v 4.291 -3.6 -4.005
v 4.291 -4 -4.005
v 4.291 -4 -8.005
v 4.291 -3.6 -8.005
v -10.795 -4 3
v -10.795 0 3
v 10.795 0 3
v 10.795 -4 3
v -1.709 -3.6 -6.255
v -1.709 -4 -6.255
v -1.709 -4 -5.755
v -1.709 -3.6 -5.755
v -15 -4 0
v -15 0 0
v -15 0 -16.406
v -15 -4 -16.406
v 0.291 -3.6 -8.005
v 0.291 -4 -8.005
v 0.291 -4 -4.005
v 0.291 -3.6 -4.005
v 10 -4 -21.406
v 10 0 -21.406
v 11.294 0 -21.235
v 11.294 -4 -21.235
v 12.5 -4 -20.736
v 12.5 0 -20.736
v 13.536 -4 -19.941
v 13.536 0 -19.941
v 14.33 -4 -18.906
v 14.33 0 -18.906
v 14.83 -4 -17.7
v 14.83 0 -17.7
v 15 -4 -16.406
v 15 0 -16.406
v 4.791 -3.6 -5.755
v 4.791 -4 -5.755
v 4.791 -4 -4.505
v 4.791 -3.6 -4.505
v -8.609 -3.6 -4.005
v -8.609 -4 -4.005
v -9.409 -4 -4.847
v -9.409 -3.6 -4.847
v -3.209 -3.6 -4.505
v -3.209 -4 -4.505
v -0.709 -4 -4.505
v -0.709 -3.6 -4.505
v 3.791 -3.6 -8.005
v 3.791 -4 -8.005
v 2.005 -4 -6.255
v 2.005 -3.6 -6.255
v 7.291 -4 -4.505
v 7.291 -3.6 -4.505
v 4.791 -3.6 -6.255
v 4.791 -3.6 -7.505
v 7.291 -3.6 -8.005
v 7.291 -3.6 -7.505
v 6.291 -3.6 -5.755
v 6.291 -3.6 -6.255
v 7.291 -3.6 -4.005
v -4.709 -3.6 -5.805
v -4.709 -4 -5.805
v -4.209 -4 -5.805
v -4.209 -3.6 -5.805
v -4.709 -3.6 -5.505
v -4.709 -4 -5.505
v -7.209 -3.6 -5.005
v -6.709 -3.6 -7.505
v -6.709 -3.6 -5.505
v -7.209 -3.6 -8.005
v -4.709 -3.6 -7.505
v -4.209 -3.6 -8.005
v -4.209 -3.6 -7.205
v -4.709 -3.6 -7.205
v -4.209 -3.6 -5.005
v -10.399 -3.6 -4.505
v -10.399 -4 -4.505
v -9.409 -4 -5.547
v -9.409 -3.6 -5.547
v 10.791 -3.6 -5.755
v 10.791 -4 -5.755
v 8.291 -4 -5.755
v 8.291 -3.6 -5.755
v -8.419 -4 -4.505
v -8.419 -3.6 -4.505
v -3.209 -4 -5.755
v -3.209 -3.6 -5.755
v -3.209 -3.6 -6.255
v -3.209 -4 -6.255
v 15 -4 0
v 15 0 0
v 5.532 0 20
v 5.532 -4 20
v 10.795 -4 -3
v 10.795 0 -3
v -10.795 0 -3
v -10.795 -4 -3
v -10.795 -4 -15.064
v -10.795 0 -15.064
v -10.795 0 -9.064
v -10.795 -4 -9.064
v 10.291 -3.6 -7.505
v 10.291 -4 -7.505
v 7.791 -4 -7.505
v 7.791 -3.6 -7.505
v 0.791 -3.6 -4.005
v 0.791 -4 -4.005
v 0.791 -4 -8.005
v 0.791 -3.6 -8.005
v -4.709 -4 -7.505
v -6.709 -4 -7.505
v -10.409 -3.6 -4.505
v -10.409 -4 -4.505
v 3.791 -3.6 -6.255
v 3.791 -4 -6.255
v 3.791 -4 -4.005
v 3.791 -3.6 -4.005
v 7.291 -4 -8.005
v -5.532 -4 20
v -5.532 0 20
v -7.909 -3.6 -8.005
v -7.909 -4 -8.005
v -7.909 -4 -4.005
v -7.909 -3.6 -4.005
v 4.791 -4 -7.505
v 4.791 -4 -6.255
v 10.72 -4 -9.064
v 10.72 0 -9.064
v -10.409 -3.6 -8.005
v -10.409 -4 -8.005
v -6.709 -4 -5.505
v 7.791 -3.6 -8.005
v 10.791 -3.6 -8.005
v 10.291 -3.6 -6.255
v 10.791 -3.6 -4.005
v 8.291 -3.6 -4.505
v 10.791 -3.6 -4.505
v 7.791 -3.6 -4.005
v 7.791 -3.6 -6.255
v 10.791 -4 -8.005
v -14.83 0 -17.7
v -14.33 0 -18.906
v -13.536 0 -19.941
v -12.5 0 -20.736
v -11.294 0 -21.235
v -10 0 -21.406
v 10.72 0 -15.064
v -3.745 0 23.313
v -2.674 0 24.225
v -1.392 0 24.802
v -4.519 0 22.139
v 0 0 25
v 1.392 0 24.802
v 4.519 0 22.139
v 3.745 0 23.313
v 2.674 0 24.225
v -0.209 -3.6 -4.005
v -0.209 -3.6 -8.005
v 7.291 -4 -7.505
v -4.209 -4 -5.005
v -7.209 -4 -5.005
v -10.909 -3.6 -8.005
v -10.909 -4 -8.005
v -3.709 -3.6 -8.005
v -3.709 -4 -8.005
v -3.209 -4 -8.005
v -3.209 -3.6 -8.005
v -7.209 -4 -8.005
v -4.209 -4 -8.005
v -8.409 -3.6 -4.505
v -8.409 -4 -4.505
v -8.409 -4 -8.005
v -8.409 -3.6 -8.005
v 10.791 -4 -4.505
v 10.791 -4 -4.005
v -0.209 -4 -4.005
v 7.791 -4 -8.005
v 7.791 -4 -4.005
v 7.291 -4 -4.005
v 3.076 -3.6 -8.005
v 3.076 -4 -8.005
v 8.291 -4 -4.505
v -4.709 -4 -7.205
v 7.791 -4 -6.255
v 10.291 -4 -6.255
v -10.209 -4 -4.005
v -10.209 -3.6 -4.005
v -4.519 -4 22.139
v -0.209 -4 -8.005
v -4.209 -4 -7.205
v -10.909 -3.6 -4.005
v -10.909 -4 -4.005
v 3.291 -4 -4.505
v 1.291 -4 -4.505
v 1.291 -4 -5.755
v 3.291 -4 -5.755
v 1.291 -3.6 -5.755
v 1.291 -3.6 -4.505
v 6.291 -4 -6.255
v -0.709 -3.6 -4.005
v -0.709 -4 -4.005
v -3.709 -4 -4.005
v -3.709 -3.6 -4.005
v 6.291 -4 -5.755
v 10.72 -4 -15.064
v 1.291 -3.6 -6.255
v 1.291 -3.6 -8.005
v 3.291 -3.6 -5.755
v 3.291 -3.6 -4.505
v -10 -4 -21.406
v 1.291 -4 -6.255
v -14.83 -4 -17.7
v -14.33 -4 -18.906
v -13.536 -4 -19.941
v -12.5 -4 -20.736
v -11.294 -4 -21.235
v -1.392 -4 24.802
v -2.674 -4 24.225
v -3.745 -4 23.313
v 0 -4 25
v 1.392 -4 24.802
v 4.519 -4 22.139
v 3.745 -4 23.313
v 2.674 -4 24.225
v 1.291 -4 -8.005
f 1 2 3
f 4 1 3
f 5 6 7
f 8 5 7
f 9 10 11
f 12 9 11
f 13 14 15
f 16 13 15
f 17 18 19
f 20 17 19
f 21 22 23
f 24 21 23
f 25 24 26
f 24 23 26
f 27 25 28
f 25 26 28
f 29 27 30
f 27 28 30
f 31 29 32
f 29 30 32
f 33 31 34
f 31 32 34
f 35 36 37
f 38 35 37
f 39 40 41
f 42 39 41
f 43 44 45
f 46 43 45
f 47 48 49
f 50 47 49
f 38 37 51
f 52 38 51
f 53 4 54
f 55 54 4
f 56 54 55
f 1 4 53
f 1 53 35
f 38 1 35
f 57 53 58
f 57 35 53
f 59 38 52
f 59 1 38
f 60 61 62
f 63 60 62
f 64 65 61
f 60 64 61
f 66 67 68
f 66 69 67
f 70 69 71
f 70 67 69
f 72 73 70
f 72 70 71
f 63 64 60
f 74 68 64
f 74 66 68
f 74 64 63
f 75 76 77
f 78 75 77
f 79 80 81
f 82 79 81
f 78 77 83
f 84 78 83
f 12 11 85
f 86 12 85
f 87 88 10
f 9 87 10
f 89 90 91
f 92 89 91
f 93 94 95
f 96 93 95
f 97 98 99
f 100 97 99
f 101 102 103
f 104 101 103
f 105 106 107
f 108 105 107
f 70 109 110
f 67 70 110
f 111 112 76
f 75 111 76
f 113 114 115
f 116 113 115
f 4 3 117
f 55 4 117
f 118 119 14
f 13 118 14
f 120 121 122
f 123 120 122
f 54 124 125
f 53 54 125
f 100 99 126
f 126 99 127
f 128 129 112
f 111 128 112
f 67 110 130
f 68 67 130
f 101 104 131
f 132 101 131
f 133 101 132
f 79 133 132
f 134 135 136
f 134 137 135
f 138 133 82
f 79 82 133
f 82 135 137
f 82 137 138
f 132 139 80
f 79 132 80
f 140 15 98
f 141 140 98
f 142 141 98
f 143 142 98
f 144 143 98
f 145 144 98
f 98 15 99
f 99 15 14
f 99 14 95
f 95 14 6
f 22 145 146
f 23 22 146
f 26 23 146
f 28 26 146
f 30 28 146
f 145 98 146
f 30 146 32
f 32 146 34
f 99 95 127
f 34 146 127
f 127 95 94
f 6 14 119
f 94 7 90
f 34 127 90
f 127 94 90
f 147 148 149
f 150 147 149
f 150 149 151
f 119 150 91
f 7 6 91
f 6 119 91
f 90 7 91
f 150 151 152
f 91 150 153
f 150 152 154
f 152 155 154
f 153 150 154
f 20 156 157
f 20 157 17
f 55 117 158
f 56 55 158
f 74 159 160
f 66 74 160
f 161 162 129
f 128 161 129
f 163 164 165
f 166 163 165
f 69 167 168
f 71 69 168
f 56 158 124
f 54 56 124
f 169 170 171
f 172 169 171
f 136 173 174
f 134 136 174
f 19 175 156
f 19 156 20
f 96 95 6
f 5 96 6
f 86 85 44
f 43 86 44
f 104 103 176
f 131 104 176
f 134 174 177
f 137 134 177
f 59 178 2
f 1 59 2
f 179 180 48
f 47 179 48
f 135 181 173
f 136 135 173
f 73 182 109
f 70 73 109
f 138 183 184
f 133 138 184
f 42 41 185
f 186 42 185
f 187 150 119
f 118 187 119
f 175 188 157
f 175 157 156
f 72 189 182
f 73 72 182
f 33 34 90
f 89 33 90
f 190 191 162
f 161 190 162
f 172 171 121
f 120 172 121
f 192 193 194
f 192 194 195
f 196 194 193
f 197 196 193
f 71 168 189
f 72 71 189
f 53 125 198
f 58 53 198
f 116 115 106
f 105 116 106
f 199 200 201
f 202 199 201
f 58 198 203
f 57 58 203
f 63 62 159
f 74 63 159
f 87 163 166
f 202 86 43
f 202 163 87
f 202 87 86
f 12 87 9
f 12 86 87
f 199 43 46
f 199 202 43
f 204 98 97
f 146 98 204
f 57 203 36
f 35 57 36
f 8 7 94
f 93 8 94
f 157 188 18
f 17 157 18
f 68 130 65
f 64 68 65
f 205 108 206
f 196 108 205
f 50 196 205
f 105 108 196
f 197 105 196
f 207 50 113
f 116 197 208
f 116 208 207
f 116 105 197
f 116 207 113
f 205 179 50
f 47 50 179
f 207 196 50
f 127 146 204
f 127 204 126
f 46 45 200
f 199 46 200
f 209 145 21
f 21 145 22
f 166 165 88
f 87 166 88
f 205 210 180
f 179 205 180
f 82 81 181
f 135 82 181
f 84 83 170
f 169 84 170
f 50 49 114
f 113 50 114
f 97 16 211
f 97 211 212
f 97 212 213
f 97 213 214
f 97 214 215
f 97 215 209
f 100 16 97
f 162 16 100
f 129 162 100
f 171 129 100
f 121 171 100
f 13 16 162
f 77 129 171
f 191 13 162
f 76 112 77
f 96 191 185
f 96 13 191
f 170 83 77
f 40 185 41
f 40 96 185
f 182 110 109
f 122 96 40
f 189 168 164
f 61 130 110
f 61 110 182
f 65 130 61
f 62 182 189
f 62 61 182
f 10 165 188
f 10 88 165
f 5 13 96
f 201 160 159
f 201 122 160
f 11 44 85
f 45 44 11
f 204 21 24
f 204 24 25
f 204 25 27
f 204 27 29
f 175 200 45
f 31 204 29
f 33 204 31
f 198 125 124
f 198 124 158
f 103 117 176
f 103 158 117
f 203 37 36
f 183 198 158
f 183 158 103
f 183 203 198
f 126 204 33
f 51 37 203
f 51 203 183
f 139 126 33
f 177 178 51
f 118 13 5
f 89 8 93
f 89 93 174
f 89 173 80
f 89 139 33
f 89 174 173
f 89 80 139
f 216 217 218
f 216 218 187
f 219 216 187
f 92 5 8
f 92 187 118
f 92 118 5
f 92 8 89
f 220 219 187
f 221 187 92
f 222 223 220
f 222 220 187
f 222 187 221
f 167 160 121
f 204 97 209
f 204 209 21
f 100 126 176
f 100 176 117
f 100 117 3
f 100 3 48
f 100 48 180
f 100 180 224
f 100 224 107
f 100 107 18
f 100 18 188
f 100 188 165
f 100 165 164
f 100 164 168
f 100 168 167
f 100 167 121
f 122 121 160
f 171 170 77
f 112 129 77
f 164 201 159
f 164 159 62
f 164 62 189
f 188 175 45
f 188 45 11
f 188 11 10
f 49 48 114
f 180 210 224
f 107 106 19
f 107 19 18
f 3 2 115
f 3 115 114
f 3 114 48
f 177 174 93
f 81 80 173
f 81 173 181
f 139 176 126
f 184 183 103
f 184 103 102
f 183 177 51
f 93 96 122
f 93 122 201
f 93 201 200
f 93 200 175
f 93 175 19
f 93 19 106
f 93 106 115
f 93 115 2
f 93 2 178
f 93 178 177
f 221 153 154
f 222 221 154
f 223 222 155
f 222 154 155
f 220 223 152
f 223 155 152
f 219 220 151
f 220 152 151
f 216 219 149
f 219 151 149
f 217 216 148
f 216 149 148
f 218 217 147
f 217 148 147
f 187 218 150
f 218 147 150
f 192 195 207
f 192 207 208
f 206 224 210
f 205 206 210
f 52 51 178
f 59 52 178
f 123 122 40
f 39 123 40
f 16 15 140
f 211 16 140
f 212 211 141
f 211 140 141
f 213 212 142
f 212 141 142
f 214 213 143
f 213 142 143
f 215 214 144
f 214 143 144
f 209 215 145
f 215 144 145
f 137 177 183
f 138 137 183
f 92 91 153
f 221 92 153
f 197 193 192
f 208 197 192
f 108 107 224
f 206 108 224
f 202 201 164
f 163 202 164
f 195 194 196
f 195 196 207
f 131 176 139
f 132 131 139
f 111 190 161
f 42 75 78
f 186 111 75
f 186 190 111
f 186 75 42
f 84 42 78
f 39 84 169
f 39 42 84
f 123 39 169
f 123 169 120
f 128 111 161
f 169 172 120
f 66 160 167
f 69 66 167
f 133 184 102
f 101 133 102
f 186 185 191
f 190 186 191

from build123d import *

# Parameters (mm, degrees)
F0_W     = 21.5146457776
F0_H     = 6
F1_DEPTH = 4
F2_W     = 0.5
F2_H     = 4
F2_W_2   = 2
F2_H_2   = 1.25
F3_DEPTH = 0.4


# Not quite as in the source:
# - a feature names something its author has since deleted; it is built from what else it names


with BuildPart() as f1:
    # F0 (on Front) → F1 (new body)
    with BuildSketch(Plane.XZ):
        with BuildLine():
            ThreePointArc((-5, 20), (0, 15), (5, 20))
            Line((5, 20), (-5, 20))
        make_face()
        with BuildLine():
            Line((-5, 20), (5, 20))
            ThreePointArc((5, 20), (4.8783151775, 21.0963763172), (4.5191835885, 22.1393876913))
            ThreePointArc((4.5191835885, 22.1393876913), (0, 25), (-4.5191835885, 22.1393876913))
            ThreePointArc((-4.5191835885, 22.1393876913), (-4.8783151775, 21.0963763172), (-5, 20))
        make_face()
        with BuildLine():
            Line((5.5319726474, 20), (5, 20))
            ThreePointArc((5, 20), (0, 15), (-5, 20))
            Line((-5, 20), (-5.5319726474, 20))
            Line((-5.5319726474, 20), (-15, 0))
            Line((-15, 0), (-10.795, 0))
            Line((-10.795, 0), (-10.795, 3))
            Line((-10.795, 3), (10.795, 3))
            Line((10.795, 3), (10.795, 0))
            Line((10.795, 0), (15, 0))
            Line((15, 0), (5.5319726474, 20))
        make_face()
        with BuildLine():
            Line((15, -16.4057657868), (15, 0))
            Line((15, 0), (10.795, 0))
            Line((10.795, 0), (10.795, -3))
            Line((10.795, -3), (-10.795, -3))
            Line((-10.795, -3), (-10.795, 0))
            Line((-10.795, 0), (-15, 0))
            Line((-15, 0), (-15, -16.4057657868))
            ThreePointArc((-15, -16.4057657868), (-13.5355339059, -19.9412996927), (-10, -21.4057657868))
            Line((-10, -21.4057657868), (10, -21.4057657868))
            ThreePointArc((10, -21.4057657868), (13.5355339059, -19.9412996927), (15, -16.4057657868))
        make_face()
        with Locations((-0.0376771112, -12.0637425241)):
            Rectangle(F0_W, F0_H, mode=Mode.SUBTRACT)
        with BuildLine():
            Line((-5.5319726474, 20), (-5, 20))
            ThreePointArc((-5, 20), (-4.8783151775, 21.0963763172), (-4.5191835885, 22.1393876913))
            Line((-4.5191835885, 22.1393876913), (-5.5319726474, 20))
        make_face()
        with BuildLine():
            ThreePointArc((4.5191835885, 22.1393876913), (4.8783151775, 21.0963763172), (5, 20))
            Line((5, 20), (5.5319726474, 20))
            Line((5.5319726474, 20), (4.5191835885, 22.1393876913))
        make_face()
    extrude(amount=F1_DEPTH)

    # F2 (on face) → F3 (cut)
    with BuildSketch(Plane.XZ.offset(4)):
        Polygon((-10.4092183411, -4.0046597868), (-10.9092183411, -4.0046597868), (-10.9092183411, -8.0046597868), (-10.4092183411, -8.0046597868), (-10.4092183411, -4.5046597868), (-10.3992183411, -4.5046597868), (-9.4092183411, -5.54676505), (-8.4192183411, -4.5046597868), (-8.4092183411, -4.5046597868), (-8.4092183411, -8.0046597868), (-7.9092183411, -8.0046597868), (-7.9092183411, -4.0046597868), (-8.4092183411, -4.0046597868), (-8.6092183411, -4.0046597868), (-9.4092183411, -4.84676505), (-10.2092183411, -4.0046597868), align=None)
        Polygon((-4.2092183411, -5.0046597868), (-7.2092183411, -5.0046597868), (-7.2092183411, -8.0046597868), (-4.2092183411, -8.0046597868), (-4.2092183411, -7.2046597868), (-4.7092183411, -7.2046597868), (-4.7092183411, -7.5046597868), (-6.7092183411, -7.5046597868), (-6.7092183411, -5.5046597868), (-4.7092183411, -5.5046597868), (-4.7092183411, -5.8046597868), (-4.2092183411, -5.8046597868), align=None)
        Polygon((-0.7092183411, -4.0046597868), (-3.7092183411, -4.0046597868), (-3.7092183411, -8.0046597868), (-3.2092183411, -8.0046597868), (-3.2092183411, -6.2546597868), (-1.7092183411, -6.2546597868), (-1.7092183411, -5.7546597868), (-3.2092183411, -5.7546597868), (-3.2092183411, -4.5046597868), (-0.7092183411, -4.5046597868), align=None)
        with Locations((0.0407816589, -6.0046597868)):
            Rectangle(F2_W, F2_H)
        Polygon((3.7907816589, -4.0046597868), (0.7907816589, -4.0046597868), (0.7907816589, -8.0046597868), (1.2907816589, -8.0046597868), (1.2907816589, -6.2546597868), (3.0764354139, -8.0046597868), (3.7907816589, -8.0046597868), (2.0051279039, -6.2546597868), (3.7907816589, -6.2546597868), align=None)
        with Locations((2.2907816589, -5.1296597868)):
            Rectangle(F2_W_2, F2_H_2, mode=Mode.SUBTRACT)
        Polygon((7.2907816589, -4.0046597868), (4.2907816589, -4.0046597868), (4.2907816589, -8.0046597868), (7.2907816589, -8.0046597868), (7.2907816589, -7.5046597868), (4.7907816589, -7.5046597868), (4.7907816589, -6.2546597868), (6.2907816589, -6.2546597868), (6.2907816589, -5.7546597868), (4.7907816589, -5.7546597868), (4.7907816589, -4.5046597868), (7.2907816589, -4.5046597868), align=None)
        Polygon((10.7907816589, -4.0046597868), (7.7907816589, -4.0046597868), (7.7907816589, -6.2546597868), (10.2907816589, -6.2546597868), (10.2907816589, -7.5046597868), (7.7907816589, -7.5046597868), (7.7907816589, -8.0046597868), (10.7907816589, -8.0046597868), (10.7907816589, -5.7546597868), (8.2907816589, -5.7546597868), (8.2907816589, -4.5046597868), (10.7907816589, -4.5046597868), align=None)
    extrude(amount=-F3_DEPTH, mode=Mode.SUBTRACT)


solid = f1.part
